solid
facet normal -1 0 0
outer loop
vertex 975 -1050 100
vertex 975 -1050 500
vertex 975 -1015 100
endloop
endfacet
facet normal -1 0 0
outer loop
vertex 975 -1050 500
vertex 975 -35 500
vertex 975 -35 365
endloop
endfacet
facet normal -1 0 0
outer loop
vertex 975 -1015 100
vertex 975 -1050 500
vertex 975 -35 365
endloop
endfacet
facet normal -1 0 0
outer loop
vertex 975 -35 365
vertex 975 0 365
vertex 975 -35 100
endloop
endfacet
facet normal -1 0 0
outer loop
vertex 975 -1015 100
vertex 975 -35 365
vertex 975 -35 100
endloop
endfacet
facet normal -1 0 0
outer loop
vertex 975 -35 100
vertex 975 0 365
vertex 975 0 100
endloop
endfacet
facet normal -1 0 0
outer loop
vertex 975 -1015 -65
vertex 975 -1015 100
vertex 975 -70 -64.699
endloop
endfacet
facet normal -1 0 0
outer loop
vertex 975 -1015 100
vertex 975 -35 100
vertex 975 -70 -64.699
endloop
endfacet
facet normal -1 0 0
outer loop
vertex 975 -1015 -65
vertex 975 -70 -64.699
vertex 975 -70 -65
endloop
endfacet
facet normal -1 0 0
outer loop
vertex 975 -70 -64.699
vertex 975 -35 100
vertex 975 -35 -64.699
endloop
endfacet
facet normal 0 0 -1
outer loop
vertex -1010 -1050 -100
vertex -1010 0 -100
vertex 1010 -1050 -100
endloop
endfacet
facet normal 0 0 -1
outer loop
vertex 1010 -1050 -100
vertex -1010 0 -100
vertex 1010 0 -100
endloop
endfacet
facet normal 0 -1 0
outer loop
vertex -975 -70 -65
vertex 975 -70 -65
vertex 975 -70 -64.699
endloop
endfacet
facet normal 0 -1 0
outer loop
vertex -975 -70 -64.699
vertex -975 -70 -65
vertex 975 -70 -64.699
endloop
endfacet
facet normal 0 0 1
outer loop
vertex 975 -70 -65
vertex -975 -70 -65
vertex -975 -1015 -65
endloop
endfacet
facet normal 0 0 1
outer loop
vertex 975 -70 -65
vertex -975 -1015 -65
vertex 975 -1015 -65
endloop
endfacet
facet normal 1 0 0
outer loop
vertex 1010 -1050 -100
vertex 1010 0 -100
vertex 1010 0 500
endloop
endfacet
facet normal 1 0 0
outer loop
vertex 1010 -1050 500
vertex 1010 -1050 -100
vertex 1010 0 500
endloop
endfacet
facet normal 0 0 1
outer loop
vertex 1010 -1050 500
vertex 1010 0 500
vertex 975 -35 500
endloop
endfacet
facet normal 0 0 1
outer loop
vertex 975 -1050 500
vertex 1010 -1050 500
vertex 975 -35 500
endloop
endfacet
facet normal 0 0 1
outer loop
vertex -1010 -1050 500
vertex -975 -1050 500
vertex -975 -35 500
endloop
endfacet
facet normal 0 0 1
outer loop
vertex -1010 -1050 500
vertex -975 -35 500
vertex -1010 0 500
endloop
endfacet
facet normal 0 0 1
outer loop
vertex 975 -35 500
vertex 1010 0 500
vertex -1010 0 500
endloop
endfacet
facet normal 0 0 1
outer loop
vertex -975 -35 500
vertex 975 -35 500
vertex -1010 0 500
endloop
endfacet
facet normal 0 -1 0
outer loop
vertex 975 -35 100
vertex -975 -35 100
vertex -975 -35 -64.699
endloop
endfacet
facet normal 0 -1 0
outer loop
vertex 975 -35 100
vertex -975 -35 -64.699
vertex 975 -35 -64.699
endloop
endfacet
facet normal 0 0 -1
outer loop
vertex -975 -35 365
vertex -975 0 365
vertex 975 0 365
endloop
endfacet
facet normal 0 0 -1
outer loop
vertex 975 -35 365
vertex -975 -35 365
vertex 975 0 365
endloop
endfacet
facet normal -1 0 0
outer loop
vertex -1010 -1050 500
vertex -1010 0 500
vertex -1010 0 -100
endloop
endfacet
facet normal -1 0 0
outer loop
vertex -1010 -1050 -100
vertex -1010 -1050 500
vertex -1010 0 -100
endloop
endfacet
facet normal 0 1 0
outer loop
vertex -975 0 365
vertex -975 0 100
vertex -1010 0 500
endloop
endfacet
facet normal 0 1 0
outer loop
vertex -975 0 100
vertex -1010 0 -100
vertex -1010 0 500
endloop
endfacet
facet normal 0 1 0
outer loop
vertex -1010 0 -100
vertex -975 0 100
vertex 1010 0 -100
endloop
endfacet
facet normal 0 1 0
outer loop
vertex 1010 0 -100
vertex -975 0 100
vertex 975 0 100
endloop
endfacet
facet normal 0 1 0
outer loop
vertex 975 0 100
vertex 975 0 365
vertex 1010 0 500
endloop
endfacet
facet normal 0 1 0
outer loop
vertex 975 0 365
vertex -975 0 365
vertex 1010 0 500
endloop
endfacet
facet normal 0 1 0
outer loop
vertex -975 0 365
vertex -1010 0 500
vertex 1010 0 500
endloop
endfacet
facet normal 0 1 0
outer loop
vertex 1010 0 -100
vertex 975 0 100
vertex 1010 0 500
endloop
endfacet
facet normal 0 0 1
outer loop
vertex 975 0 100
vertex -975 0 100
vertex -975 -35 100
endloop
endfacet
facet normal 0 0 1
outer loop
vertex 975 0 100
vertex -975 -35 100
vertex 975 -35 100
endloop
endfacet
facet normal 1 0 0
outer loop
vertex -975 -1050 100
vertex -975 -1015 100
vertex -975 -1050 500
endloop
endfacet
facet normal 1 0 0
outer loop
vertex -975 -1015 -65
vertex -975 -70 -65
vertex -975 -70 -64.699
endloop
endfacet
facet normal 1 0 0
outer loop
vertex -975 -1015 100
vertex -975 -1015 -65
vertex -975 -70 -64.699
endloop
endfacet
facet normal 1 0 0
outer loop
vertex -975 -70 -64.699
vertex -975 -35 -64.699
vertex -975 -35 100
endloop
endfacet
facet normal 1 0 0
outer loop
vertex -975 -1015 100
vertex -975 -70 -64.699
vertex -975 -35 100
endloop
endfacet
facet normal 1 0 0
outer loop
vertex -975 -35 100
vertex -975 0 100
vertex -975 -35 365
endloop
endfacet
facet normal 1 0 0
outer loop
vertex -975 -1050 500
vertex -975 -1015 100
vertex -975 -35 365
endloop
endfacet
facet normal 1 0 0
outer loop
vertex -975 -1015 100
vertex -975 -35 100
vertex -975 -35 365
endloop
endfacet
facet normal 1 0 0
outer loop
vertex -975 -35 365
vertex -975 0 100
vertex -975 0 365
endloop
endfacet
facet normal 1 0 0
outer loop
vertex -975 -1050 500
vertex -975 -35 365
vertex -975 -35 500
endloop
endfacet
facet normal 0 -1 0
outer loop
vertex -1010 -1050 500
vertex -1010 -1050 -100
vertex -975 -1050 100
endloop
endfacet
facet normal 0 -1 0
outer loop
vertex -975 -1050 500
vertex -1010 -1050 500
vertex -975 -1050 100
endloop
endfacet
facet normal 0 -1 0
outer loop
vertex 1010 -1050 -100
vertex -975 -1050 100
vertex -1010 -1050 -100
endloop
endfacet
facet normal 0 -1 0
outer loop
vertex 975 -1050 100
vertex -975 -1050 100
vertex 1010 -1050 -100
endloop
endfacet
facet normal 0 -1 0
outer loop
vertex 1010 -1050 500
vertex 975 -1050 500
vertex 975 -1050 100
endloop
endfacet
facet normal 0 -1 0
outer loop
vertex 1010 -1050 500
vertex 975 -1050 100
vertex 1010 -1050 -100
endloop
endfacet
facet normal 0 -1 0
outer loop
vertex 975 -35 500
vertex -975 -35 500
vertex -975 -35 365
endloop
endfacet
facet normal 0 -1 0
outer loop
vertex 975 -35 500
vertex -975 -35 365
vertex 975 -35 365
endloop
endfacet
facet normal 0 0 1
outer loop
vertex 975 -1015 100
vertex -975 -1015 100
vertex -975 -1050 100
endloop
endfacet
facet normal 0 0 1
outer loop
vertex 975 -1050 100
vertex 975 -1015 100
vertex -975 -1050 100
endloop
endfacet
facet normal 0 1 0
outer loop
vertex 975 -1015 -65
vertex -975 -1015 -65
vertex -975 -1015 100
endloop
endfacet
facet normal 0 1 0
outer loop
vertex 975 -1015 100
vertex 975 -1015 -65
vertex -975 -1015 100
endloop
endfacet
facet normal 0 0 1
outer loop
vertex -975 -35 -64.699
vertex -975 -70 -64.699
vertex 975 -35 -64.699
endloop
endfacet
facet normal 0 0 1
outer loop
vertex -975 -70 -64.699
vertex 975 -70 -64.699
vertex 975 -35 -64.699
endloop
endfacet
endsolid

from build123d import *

# Parameters (mm, degrees)
F0_W     = 1950
F0_H     = 35
F1_DEPTH = 1050
F0_H_2   = 135
F0_H_3   = 165
F2_DEPTH = 35
F3_W     = 35
F3_H     = 35
F4_DEPTH = 975


with BuildPart() as f1:
    # F0 (on Front) → F1 (new body)
    with BuildSketch(Plane.XZ):
        Polygon((-975, -65), (-975, 100), (-975, 365), (-975, 500), (-1010, 500), (-1010, -100), (-975, -100), align=None)
        with Locations((0, -82.5)):
            Rectangle(F0_W, F0_H)
        Polygon((975, 365), (975, 100), (975, -65), (975, -100), (1010, -100), (1010, 500), (975, 500), align=None)
    extrude(amount=F1_DEPTH)

    # F0 (on Front) → F2 (join)
    with BuildSketch(Plane.XZ):
        Polygon((-975, -65), (-975, 100), (-975, 365), (-975, 500), (-1010, 500), (-1010, -100), (-975, -100), align=None)
        Polygon((975, 365), (975, 100), (975, -65), (975, -100), (1010, -100), (1010, 500), (975, 500), align=None)
        with Locations((0, -82.5)):
            Rectangle(F0_W, F0_H)
        with Locations((0, 432.5)):
            Rectangle(F0_W, F0_H_2)
        with Locations((0, 17.5)):
            Rectangle(F0_W, F0_H_3)
    extrude(amount=F2_DEPTH)

    # F3 (on Right) → F4 (join, symmetric)
    with BuildSketch(Plane.YZ):
        Polygon((-1015, 100), (-1050, 100), (-1050, -100), (-1015, -100), (-1015, -65), align=None)
        with Locations((-997.5, -82.5)):
            Rectangle(F3_W, F3_H)
        with Locations((-52.5, -82.198536)):
            Rectangle(F3_W, F3_H)
    extrude(amount=F4_DEPTH, both=True)


solid = f1.part
